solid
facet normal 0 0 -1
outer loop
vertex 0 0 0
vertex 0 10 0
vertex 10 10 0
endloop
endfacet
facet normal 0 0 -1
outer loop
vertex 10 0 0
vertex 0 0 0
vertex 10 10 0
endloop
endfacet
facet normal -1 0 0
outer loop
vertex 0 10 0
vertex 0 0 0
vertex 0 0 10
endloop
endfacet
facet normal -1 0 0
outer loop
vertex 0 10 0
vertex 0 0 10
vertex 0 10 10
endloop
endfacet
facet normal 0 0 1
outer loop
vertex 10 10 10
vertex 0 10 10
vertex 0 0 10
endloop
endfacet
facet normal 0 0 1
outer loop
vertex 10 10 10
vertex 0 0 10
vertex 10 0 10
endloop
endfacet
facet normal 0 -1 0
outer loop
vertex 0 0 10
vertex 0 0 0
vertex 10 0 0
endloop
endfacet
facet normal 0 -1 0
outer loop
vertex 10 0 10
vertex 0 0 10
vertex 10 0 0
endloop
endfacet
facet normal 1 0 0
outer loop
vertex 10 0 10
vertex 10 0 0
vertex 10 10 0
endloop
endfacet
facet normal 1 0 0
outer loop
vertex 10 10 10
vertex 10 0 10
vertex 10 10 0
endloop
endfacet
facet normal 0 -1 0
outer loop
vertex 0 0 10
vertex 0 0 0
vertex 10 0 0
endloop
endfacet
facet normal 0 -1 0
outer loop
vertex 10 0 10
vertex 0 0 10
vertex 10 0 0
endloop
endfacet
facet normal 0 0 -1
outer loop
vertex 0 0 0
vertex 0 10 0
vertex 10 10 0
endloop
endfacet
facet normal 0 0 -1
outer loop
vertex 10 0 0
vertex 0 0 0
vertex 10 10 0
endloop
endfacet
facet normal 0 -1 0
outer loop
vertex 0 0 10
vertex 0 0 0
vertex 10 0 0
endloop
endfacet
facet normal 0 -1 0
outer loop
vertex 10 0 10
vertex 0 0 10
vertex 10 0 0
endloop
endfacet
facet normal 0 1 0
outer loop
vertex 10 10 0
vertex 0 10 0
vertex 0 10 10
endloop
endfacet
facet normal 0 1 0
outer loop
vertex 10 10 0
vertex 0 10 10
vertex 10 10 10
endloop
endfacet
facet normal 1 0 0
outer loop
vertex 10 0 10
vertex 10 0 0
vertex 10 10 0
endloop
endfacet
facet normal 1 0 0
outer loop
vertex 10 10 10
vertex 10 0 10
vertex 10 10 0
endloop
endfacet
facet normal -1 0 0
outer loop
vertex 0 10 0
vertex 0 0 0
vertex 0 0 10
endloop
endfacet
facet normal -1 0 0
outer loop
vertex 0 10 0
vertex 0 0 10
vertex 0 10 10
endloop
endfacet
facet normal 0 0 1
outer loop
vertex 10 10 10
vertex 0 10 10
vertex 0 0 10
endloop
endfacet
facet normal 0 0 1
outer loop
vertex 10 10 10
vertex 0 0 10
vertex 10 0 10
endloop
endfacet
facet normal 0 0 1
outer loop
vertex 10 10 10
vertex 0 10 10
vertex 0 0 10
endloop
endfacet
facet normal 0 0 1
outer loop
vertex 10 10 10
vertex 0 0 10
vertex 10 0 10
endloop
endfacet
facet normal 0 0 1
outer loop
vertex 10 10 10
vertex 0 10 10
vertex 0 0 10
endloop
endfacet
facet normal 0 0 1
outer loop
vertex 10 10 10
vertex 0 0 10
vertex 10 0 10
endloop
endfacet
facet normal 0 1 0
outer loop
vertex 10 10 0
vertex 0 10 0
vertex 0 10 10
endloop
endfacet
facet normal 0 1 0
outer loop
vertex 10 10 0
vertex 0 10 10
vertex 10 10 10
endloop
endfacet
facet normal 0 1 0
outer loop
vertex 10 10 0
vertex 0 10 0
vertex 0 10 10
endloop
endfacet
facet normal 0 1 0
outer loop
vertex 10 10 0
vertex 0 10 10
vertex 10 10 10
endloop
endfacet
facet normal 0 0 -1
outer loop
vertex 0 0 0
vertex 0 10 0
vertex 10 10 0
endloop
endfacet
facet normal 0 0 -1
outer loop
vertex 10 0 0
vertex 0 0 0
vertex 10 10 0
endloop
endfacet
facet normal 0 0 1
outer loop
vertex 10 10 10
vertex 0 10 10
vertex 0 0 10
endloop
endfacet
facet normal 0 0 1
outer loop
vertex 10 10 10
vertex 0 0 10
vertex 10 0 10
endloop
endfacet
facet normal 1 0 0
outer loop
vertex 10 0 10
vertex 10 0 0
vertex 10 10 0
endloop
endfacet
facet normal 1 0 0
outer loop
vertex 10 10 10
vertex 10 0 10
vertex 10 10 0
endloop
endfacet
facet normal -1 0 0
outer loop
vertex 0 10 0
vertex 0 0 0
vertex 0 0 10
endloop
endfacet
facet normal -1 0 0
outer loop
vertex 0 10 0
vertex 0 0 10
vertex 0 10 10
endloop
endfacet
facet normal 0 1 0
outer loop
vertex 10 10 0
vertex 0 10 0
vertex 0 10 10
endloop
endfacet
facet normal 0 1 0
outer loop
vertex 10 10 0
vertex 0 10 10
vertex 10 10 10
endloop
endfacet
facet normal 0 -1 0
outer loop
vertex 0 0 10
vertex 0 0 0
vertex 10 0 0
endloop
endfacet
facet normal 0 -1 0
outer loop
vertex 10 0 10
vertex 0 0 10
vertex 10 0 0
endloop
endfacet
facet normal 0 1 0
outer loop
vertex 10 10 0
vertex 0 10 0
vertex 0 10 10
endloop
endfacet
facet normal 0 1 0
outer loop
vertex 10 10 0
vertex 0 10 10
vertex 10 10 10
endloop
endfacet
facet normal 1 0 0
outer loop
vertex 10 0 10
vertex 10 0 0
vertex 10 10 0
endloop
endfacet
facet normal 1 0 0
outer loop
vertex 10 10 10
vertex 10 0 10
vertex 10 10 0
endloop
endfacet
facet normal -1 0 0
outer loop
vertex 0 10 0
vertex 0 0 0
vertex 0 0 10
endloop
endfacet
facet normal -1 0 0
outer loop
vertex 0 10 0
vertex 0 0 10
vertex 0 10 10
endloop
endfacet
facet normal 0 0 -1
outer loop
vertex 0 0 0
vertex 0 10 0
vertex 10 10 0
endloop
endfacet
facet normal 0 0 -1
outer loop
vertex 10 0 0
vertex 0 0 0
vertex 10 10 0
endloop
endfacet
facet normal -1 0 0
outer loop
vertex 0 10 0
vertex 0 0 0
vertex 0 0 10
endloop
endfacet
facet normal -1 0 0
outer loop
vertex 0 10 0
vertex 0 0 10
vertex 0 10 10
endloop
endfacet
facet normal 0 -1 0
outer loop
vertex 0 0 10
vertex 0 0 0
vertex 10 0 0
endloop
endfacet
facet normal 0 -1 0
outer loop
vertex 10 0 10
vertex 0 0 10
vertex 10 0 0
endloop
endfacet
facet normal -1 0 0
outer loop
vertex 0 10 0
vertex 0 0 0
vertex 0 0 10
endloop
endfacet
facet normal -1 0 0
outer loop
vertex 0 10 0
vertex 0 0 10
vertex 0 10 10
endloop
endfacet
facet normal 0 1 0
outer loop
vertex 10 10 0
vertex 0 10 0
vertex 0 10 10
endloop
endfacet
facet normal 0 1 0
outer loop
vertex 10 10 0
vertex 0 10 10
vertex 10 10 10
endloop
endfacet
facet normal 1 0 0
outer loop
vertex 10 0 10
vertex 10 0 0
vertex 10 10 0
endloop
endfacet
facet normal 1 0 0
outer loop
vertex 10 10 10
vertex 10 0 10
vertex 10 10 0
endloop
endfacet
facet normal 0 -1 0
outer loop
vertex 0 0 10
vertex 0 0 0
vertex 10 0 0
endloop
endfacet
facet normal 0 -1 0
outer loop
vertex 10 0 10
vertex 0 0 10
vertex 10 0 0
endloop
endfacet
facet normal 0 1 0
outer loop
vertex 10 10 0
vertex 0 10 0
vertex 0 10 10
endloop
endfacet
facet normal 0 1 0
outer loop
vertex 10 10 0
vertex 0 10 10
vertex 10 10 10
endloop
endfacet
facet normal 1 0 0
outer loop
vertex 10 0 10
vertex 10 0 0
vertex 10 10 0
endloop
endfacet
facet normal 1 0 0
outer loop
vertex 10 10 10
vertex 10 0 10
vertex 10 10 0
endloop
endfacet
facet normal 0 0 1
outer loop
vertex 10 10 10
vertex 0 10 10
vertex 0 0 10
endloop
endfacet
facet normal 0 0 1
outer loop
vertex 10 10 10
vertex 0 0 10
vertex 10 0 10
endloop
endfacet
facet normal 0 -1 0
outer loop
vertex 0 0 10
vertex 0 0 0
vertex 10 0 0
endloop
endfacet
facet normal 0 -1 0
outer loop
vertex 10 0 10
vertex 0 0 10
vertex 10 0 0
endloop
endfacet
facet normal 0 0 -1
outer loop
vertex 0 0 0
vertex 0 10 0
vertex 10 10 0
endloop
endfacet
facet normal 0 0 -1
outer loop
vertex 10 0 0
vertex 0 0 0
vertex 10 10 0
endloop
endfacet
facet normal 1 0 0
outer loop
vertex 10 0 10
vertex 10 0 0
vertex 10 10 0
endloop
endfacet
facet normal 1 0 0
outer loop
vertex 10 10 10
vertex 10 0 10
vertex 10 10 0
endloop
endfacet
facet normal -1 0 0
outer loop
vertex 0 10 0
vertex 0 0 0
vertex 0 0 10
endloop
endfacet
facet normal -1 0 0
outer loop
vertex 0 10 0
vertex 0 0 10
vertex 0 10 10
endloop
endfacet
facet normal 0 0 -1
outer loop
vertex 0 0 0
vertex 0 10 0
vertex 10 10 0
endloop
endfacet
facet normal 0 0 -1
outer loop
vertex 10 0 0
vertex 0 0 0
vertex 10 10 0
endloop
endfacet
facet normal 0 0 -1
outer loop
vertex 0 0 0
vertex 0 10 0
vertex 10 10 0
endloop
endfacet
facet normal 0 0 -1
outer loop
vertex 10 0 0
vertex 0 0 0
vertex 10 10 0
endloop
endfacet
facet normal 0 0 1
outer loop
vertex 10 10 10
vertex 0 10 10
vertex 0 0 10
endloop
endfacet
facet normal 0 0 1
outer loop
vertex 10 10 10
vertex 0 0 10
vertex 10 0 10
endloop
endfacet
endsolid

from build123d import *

# Parameters (mm, degrees)
BOX_W        = 10
BOX_H        = 10
BOX_DEPTH    = 10
BOX001_W     = 10
BOX001_H     = 10
BOX001_DEPTH = 10
BOX002_W     = 10
BOX002_H     = 10
BOX002_DEPTH = 10
BOX003_W     = 10
BOX003_H     = 10
BOX003_DEPTH = 10
BOX004_W     = 10
BOX004_H     = 10
BOX004_DEPTH = 10
BOX005_W     = 10
BOX005_H     = 10
BOX005_DEPTH = 10
BOX006_W     = 10
BOX006_H     = 10
BOX006_DEPTH = 10


with BuildPart() as cubo:
    # Box → Box (new body)
    with BuildSketch(Plane.XY):
        with Locations((5, 5)):
            Rectangle(BOX_W, BOX_H)
    extrude(amount=BOX_DEPTH)


with BuildPart() as cubo001:
    # Box001 → Box001 (new body)
    with BuildSketch(Plane.XY):
        with Locations((5, 5)):
            Rectangle(BOX001_W, BOX001_H)
    extrude(amount=BOX001_DEPTH)


with BuildPart() as cubo002:
    # Box002 → Box002 (new body)
    with BuildSketch(Plane.XY):
        with Locations((5, 5)):
            Rectangle(BOX002_W, BOX002_H)
    extrude(amount=BOX002_DEPTH)


with BuildPart() as cubo003:
    # Box003 → Box003 (new body)
    with BuildSketch(Plane.XY):
        with Locations((5, 5)):
            Rectangle(BOX003_W, BOX003_H)
    extrude(amount=BOX003_DEPTH)


with BuildPart() as cubo004:
    # Box004 → Box004 (new body)
    with BuildSketch(Plane.XY):
        with Locations((5, 5)):
            Rectangle(BOX004_W, BOX004_H)
    extrude(amount=BOX004_DEPTH)


with BuildPart() as cubo005:
    # Box005 → Box005 (new body)
    with BuildSketch(Plane.XY):
        with Locations((5, 5)):
            Rectangle(BOX005_W, BOX005_H)
    extrude(amount=BOX005_DEPTH)


with BuildPart() as cubo006:
    # Box006 → Box006 (new body)
    with BuildSketch(Plane.XY):
        with Locations((5, 5)):
            Rectangle(BOX006_W, BOX006_H)
    extrude(amount=BOX006_DEPTH)


solid = Compound([cubo.part, cubo001.part, cubo002.part, cubo003.part, cubo004.part, cubo005.part, cubo006.part])
